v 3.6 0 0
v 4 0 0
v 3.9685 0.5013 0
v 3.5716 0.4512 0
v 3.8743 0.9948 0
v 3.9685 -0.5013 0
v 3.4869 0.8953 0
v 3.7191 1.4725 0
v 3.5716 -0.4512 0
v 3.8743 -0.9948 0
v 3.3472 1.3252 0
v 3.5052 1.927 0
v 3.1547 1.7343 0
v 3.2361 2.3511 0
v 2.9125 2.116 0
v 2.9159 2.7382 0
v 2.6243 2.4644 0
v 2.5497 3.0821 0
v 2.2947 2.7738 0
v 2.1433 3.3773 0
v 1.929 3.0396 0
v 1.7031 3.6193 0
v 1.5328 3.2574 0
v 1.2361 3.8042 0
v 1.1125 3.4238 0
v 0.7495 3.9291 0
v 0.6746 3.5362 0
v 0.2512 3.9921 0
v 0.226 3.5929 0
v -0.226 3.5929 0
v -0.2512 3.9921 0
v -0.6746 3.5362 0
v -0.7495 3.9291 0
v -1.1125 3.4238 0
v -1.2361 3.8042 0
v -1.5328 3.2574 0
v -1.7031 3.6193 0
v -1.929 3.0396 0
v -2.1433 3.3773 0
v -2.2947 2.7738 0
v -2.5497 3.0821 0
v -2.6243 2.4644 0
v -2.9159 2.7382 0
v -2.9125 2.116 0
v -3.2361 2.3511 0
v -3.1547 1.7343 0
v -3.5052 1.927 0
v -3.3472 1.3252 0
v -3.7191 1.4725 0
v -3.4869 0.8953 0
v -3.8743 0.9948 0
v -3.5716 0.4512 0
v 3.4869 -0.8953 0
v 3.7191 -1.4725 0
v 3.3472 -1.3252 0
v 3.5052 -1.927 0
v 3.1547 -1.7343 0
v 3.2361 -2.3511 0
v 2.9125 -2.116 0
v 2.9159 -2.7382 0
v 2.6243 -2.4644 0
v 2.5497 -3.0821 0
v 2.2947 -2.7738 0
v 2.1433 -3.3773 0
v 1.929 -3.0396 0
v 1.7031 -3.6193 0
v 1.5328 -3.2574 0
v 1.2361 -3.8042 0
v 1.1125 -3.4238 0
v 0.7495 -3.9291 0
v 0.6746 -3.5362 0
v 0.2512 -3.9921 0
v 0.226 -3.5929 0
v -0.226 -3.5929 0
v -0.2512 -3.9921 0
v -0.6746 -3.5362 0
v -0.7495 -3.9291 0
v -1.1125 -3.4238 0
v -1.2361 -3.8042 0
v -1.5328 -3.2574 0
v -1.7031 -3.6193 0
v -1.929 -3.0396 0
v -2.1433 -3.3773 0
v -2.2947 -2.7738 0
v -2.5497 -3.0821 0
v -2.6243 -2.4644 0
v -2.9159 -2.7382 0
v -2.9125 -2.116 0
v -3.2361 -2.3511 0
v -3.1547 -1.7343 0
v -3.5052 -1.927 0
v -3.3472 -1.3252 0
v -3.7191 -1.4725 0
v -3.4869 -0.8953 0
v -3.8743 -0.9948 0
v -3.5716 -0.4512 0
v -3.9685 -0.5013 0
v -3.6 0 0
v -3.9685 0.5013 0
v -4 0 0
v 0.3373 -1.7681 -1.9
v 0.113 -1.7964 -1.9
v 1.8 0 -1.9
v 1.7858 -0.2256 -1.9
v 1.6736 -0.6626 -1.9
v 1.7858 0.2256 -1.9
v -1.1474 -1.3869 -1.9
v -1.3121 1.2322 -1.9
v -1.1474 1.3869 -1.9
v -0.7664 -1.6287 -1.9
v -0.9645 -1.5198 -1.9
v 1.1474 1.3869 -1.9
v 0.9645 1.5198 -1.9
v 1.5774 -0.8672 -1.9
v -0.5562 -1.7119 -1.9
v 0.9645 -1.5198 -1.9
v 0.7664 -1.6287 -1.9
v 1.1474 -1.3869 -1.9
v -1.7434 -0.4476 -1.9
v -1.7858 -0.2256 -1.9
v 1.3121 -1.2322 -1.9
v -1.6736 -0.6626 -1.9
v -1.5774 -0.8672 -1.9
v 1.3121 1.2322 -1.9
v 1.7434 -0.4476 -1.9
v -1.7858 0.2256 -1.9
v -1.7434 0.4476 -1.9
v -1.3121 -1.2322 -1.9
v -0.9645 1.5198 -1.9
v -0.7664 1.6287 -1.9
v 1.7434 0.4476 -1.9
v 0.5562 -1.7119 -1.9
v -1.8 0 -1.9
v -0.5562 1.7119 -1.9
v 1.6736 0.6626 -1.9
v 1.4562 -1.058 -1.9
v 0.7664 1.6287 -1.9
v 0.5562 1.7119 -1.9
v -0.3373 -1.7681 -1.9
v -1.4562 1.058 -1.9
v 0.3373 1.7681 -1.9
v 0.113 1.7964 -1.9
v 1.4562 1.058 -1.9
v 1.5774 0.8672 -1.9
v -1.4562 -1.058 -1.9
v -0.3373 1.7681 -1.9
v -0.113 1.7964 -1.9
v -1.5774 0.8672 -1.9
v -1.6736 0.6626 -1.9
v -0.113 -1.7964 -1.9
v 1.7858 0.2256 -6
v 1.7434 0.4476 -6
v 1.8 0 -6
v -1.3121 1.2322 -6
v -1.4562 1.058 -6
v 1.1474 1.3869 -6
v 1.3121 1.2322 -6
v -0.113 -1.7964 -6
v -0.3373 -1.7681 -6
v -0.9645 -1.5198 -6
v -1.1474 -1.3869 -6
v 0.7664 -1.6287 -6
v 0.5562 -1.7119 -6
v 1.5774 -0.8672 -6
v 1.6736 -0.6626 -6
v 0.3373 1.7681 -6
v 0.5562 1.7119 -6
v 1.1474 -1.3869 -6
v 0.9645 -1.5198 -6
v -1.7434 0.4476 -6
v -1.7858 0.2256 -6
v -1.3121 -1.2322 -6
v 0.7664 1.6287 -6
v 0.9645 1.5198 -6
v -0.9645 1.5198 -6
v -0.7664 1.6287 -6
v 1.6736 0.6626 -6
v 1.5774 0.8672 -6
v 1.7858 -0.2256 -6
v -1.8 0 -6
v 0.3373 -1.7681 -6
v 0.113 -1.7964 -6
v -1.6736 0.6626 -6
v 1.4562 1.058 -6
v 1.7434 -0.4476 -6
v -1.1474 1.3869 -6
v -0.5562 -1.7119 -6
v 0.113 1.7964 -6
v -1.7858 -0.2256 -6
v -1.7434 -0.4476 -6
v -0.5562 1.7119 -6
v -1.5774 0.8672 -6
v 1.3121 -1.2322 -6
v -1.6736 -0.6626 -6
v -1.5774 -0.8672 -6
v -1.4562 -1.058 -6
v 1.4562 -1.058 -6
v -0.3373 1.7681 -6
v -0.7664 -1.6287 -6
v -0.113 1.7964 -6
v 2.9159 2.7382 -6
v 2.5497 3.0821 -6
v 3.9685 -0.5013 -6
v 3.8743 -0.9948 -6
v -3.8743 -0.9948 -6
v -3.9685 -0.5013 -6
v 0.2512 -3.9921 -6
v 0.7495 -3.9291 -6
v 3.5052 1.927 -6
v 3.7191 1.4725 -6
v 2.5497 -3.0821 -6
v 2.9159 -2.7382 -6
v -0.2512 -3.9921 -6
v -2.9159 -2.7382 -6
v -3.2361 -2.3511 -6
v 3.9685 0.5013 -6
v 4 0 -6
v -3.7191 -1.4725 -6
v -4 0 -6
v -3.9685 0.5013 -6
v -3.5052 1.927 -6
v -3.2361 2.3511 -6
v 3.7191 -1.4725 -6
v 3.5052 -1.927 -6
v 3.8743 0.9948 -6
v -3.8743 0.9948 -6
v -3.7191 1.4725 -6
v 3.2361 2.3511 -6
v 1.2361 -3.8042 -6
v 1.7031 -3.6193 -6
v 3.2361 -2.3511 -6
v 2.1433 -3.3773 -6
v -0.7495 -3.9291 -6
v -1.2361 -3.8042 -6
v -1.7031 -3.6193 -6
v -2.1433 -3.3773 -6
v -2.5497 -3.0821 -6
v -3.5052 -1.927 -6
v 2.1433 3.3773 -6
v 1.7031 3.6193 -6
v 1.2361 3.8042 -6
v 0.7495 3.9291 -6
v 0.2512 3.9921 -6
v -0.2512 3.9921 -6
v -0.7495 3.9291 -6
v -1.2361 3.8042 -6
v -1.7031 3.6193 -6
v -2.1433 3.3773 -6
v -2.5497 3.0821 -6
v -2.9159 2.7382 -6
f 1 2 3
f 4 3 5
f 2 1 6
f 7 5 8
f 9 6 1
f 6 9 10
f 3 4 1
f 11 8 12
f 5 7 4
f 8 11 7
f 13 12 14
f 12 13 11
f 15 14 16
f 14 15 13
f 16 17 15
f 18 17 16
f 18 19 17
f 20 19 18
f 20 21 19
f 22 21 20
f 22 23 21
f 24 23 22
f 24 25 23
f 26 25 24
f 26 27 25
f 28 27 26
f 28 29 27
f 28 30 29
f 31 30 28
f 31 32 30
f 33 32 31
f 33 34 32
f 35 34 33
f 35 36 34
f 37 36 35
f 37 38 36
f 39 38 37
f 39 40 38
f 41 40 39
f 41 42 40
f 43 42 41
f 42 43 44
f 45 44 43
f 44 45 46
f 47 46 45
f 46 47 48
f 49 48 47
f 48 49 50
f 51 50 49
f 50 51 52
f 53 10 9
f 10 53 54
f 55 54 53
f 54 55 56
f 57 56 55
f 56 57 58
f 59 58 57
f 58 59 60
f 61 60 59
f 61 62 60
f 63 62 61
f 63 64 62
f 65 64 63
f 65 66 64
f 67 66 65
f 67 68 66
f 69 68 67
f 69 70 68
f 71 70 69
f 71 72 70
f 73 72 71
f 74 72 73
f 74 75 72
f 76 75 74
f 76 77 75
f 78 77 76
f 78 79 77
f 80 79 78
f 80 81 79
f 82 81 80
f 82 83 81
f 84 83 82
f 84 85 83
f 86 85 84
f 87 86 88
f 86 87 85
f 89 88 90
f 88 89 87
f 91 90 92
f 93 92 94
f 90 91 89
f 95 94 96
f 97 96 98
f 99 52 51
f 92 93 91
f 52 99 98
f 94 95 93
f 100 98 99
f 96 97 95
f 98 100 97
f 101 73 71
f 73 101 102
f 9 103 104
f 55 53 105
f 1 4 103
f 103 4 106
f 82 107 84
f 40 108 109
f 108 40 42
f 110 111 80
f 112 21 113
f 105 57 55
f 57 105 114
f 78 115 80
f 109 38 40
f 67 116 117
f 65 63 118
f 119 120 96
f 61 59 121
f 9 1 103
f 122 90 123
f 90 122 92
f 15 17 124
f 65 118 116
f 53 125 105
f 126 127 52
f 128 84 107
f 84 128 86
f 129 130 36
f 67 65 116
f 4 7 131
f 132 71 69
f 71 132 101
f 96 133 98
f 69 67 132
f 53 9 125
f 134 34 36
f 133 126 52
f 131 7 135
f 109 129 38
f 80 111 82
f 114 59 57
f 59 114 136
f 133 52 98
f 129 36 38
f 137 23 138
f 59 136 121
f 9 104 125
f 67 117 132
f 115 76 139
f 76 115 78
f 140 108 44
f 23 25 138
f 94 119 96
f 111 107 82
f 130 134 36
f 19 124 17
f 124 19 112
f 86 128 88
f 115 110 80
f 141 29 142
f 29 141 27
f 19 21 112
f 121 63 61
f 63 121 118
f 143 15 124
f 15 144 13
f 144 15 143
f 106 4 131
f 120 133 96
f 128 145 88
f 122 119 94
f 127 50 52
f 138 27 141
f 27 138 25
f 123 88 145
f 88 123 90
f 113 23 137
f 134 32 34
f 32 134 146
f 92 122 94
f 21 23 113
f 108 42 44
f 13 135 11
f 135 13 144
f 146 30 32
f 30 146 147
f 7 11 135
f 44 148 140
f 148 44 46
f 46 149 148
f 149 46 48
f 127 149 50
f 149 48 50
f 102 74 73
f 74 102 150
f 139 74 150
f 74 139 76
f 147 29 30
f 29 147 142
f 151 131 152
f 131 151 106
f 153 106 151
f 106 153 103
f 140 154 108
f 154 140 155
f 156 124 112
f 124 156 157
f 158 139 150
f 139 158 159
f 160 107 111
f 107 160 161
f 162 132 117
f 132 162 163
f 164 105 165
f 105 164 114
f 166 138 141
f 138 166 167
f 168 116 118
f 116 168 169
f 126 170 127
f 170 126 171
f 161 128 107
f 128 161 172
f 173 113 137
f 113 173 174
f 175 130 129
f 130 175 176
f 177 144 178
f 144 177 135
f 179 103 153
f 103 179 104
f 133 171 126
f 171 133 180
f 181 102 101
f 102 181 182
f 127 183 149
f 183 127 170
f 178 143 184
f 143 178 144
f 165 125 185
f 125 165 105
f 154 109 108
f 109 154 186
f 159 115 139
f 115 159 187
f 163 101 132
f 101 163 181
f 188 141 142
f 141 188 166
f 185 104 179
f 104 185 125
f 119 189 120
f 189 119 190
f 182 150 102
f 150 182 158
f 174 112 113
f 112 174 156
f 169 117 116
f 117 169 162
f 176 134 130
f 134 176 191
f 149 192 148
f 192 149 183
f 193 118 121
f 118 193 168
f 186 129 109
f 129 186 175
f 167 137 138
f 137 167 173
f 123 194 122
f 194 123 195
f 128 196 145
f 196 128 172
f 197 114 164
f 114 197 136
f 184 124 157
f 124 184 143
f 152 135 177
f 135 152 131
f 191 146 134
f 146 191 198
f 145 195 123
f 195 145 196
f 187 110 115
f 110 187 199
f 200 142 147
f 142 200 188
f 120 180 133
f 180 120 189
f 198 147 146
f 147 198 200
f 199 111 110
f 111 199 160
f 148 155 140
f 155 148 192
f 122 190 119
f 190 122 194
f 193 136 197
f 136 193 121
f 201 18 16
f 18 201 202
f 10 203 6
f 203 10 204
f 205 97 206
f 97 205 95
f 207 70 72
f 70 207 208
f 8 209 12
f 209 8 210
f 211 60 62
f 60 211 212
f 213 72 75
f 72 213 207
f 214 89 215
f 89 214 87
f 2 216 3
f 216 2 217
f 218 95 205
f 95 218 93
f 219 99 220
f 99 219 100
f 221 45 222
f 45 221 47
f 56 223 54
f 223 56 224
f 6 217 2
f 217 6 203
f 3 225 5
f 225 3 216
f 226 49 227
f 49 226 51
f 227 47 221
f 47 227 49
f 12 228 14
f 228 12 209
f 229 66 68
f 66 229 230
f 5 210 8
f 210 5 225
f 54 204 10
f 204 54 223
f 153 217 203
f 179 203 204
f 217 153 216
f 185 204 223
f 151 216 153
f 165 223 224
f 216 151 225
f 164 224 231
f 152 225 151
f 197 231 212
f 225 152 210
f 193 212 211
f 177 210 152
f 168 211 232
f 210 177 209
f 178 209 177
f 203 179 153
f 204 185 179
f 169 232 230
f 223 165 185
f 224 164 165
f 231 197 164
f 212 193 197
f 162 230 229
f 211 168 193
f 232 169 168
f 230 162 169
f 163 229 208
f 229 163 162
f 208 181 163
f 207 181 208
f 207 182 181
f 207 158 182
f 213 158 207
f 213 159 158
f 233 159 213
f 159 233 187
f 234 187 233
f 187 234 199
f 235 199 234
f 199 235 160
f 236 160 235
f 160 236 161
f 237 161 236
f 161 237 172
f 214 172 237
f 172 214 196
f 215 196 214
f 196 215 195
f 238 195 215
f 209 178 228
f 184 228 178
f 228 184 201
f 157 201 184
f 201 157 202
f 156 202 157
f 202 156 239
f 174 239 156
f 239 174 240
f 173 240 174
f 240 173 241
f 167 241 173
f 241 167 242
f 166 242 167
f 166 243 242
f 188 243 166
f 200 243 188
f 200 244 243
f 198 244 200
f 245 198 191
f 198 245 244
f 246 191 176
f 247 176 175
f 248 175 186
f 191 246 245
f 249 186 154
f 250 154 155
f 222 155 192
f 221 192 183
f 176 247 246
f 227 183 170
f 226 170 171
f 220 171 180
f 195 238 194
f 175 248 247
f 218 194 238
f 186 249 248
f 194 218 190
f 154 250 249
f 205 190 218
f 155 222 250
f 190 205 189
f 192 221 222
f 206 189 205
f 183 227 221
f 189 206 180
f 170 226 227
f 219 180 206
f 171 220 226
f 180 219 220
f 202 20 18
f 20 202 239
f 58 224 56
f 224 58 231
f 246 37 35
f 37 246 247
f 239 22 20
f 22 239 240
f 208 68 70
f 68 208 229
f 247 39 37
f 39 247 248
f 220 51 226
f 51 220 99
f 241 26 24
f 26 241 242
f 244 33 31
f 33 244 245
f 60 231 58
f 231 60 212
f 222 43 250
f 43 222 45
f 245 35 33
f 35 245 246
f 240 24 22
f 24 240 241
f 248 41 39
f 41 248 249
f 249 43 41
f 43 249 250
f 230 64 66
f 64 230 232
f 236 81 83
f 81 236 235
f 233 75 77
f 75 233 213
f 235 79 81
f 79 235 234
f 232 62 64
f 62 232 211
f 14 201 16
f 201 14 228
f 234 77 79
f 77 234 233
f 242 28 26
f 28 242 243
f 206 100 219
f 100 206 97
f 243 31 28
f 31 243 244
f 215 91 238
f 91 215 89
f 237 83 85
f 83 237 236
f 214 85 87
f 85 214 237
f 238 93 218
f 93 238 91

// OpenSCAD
$fn = 50;

difference() {
	union() {
		translate(v = [0, 0, -6.0]) {
			cylinder(h = 9, r = 4.0);
		}
	}
	union() {
		translate(v = [0, 0, 0]) {
			rotate(a = [0, 0, 0]) {
				difference() {
					union() {
						translate(v = [0, 0, -9.0]) {
							cylinder(h = 9, r = 1.5);
						}
						translate(v = [0, 0, -1.9]) {
							cylinder(h = 1.9, r1 = 1.8, r2 = 3.6);
						}
						translate(v = [0, 0, -9.0]) {
							cylinder(h = 9, r = 1.8);
						}
						translate(v = [0, 0, -9.0]) {
							cylinder(h = 9, r = 1.5);
						}
					}
					union();
				}
			}
		}
		#cylinder(h = 3, r = 5.0);
	}
}
